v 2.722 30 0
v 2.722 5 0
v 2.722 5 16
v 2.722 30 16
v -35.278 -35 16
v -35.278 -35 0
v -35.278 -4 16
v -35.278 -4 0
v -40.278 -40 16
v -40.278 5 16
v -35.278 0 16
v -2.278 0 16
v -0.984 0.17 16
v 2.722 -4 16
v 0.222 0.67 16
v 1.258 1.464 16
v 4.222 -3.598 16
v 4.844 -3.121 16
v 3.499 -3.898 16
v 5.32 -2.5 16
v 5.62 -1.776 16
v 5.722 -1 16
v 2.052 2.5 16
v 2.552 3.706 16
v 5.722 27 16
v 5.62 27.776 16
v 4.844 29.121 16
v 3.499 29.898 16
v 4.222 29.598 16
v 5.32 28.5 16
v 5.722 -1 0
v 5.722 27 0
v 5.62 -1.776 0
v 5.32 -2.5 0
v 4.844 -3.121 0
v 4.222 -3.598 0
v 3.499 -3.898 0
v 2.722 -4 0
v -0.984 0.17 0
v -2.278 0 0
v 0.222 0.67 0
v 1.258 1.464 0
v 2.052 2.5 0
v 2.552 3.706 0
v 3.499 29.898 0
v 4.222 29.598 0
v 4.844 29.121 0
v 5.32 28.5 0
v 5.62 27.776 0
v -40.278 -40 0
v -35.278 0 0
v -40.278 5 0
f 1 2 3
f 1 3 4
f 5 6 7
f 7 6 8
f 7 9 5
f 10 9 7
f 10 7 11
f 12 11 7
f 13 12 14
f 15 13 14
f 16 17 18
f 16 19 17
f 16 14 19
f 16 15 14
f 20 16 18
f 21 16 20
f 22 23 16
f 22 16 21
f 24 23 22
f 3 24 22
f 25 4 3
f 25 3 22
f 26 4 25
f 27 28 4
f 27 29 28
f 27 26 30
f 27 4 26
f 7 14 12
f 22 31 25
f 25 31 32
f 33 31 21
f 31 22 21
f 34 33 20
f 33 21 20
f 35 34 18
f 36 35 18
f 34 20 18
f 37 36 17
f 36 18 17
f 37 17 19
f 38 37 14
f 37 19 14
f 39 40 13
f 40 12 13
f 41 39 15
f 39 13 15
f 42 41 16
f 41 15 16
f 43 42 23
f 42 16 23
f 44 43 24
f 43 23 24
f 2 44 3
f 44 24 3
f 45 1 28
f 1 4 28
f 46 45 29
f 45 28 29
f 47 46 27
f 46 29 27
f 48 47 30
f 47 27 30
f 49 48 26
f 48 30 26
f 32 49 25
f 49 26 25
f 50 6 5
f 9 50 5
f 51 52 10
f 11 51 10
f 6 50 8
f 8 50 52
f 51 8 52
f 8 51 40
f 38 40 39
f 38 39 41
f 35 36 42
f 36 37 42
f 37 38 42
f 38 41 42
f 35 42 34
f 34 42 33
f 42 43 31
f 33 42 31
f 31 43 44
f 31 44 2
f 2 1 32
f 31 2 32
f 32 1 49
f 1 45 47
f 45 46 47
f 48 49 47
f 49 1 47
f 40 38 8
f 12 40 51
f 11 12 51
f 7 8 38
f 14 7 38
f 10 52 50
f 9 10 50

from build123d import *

# Parameters (mm, degrees)
F0_W     = 5
F0_H     = 5
F0_W_2   = 3
F0_H_2   = 30
F1_DEPTH = 16
F2_SIZE  = 4.99999
F3_SIZE  = 4.99999
F4_R     = 5
F5_R     = 2.99999


# Not quite as in the source:
# - a fillet or chamfer is up to 0.001 mm smaller than in the source, because OpenCascade refuses the exact size


with BuildPart() as f1:
    # F0 (on Top) → F1 (new body)
    with BuildSketch(Plane.XY):
        with Locations((-37.7777791023, 2.5)):
            Rectangle(F0_W, F0_H)
        Polygon((-35.2777791023, -4), (-35.2777791023, 0), (-40.2777791023, 0), (-40.2777791023, -40), (-35.2777791023, -40), align=None)
        Polygon((2.7222208977, 0), (-35.2777791023, 0), (-35.2777791023, -4), (5.7222208977, -4), (5.7222208977, 0), align=None)
        with Locations((4.2222208977, 15)):
            Rectangle(F0_W_2, F0_H_2)
    extrude(amount=F1_DEPTH)

    # F2 (size 5 in the source; OpenCascade refuses exactly that, so slightly less here)
    f2_edges = [f1.edges().sort_by_distance(p)[0] for p in [
        (-35.277779, 5, 8),
    ]]
    chamfer(f2_edges, length=F2_SIZE)

    # F3 (size 5 in the source; OpenCascade refuses exactly that, so slightly less here)
    f3_edges = [f1.edges().sort_by_distance(p)[0] for p in [
        (-35.277779, -40, 8),
    ]]
    chamfer(f3_edges, length=F3_SIZE)

    # F4
    f4_edges = [f1.edges().sort_by_distance(p)[0] for p in [
        (2.722221, 0, 8),
    ]]
    fillet(f4_edges, radius=F4_R)

    # F5 (radius 3 in the source; OpenCascade refuses exactly that, so slightly less here)
    f5_edges = [f1.edges().sort_by_distance(p)[0] for p in [
        (5.722221, -4, 8),
        (5.722221, 30, 8),
    ]]
    fillet(f5_edges, radius=F5_R)


solid = f1.part
